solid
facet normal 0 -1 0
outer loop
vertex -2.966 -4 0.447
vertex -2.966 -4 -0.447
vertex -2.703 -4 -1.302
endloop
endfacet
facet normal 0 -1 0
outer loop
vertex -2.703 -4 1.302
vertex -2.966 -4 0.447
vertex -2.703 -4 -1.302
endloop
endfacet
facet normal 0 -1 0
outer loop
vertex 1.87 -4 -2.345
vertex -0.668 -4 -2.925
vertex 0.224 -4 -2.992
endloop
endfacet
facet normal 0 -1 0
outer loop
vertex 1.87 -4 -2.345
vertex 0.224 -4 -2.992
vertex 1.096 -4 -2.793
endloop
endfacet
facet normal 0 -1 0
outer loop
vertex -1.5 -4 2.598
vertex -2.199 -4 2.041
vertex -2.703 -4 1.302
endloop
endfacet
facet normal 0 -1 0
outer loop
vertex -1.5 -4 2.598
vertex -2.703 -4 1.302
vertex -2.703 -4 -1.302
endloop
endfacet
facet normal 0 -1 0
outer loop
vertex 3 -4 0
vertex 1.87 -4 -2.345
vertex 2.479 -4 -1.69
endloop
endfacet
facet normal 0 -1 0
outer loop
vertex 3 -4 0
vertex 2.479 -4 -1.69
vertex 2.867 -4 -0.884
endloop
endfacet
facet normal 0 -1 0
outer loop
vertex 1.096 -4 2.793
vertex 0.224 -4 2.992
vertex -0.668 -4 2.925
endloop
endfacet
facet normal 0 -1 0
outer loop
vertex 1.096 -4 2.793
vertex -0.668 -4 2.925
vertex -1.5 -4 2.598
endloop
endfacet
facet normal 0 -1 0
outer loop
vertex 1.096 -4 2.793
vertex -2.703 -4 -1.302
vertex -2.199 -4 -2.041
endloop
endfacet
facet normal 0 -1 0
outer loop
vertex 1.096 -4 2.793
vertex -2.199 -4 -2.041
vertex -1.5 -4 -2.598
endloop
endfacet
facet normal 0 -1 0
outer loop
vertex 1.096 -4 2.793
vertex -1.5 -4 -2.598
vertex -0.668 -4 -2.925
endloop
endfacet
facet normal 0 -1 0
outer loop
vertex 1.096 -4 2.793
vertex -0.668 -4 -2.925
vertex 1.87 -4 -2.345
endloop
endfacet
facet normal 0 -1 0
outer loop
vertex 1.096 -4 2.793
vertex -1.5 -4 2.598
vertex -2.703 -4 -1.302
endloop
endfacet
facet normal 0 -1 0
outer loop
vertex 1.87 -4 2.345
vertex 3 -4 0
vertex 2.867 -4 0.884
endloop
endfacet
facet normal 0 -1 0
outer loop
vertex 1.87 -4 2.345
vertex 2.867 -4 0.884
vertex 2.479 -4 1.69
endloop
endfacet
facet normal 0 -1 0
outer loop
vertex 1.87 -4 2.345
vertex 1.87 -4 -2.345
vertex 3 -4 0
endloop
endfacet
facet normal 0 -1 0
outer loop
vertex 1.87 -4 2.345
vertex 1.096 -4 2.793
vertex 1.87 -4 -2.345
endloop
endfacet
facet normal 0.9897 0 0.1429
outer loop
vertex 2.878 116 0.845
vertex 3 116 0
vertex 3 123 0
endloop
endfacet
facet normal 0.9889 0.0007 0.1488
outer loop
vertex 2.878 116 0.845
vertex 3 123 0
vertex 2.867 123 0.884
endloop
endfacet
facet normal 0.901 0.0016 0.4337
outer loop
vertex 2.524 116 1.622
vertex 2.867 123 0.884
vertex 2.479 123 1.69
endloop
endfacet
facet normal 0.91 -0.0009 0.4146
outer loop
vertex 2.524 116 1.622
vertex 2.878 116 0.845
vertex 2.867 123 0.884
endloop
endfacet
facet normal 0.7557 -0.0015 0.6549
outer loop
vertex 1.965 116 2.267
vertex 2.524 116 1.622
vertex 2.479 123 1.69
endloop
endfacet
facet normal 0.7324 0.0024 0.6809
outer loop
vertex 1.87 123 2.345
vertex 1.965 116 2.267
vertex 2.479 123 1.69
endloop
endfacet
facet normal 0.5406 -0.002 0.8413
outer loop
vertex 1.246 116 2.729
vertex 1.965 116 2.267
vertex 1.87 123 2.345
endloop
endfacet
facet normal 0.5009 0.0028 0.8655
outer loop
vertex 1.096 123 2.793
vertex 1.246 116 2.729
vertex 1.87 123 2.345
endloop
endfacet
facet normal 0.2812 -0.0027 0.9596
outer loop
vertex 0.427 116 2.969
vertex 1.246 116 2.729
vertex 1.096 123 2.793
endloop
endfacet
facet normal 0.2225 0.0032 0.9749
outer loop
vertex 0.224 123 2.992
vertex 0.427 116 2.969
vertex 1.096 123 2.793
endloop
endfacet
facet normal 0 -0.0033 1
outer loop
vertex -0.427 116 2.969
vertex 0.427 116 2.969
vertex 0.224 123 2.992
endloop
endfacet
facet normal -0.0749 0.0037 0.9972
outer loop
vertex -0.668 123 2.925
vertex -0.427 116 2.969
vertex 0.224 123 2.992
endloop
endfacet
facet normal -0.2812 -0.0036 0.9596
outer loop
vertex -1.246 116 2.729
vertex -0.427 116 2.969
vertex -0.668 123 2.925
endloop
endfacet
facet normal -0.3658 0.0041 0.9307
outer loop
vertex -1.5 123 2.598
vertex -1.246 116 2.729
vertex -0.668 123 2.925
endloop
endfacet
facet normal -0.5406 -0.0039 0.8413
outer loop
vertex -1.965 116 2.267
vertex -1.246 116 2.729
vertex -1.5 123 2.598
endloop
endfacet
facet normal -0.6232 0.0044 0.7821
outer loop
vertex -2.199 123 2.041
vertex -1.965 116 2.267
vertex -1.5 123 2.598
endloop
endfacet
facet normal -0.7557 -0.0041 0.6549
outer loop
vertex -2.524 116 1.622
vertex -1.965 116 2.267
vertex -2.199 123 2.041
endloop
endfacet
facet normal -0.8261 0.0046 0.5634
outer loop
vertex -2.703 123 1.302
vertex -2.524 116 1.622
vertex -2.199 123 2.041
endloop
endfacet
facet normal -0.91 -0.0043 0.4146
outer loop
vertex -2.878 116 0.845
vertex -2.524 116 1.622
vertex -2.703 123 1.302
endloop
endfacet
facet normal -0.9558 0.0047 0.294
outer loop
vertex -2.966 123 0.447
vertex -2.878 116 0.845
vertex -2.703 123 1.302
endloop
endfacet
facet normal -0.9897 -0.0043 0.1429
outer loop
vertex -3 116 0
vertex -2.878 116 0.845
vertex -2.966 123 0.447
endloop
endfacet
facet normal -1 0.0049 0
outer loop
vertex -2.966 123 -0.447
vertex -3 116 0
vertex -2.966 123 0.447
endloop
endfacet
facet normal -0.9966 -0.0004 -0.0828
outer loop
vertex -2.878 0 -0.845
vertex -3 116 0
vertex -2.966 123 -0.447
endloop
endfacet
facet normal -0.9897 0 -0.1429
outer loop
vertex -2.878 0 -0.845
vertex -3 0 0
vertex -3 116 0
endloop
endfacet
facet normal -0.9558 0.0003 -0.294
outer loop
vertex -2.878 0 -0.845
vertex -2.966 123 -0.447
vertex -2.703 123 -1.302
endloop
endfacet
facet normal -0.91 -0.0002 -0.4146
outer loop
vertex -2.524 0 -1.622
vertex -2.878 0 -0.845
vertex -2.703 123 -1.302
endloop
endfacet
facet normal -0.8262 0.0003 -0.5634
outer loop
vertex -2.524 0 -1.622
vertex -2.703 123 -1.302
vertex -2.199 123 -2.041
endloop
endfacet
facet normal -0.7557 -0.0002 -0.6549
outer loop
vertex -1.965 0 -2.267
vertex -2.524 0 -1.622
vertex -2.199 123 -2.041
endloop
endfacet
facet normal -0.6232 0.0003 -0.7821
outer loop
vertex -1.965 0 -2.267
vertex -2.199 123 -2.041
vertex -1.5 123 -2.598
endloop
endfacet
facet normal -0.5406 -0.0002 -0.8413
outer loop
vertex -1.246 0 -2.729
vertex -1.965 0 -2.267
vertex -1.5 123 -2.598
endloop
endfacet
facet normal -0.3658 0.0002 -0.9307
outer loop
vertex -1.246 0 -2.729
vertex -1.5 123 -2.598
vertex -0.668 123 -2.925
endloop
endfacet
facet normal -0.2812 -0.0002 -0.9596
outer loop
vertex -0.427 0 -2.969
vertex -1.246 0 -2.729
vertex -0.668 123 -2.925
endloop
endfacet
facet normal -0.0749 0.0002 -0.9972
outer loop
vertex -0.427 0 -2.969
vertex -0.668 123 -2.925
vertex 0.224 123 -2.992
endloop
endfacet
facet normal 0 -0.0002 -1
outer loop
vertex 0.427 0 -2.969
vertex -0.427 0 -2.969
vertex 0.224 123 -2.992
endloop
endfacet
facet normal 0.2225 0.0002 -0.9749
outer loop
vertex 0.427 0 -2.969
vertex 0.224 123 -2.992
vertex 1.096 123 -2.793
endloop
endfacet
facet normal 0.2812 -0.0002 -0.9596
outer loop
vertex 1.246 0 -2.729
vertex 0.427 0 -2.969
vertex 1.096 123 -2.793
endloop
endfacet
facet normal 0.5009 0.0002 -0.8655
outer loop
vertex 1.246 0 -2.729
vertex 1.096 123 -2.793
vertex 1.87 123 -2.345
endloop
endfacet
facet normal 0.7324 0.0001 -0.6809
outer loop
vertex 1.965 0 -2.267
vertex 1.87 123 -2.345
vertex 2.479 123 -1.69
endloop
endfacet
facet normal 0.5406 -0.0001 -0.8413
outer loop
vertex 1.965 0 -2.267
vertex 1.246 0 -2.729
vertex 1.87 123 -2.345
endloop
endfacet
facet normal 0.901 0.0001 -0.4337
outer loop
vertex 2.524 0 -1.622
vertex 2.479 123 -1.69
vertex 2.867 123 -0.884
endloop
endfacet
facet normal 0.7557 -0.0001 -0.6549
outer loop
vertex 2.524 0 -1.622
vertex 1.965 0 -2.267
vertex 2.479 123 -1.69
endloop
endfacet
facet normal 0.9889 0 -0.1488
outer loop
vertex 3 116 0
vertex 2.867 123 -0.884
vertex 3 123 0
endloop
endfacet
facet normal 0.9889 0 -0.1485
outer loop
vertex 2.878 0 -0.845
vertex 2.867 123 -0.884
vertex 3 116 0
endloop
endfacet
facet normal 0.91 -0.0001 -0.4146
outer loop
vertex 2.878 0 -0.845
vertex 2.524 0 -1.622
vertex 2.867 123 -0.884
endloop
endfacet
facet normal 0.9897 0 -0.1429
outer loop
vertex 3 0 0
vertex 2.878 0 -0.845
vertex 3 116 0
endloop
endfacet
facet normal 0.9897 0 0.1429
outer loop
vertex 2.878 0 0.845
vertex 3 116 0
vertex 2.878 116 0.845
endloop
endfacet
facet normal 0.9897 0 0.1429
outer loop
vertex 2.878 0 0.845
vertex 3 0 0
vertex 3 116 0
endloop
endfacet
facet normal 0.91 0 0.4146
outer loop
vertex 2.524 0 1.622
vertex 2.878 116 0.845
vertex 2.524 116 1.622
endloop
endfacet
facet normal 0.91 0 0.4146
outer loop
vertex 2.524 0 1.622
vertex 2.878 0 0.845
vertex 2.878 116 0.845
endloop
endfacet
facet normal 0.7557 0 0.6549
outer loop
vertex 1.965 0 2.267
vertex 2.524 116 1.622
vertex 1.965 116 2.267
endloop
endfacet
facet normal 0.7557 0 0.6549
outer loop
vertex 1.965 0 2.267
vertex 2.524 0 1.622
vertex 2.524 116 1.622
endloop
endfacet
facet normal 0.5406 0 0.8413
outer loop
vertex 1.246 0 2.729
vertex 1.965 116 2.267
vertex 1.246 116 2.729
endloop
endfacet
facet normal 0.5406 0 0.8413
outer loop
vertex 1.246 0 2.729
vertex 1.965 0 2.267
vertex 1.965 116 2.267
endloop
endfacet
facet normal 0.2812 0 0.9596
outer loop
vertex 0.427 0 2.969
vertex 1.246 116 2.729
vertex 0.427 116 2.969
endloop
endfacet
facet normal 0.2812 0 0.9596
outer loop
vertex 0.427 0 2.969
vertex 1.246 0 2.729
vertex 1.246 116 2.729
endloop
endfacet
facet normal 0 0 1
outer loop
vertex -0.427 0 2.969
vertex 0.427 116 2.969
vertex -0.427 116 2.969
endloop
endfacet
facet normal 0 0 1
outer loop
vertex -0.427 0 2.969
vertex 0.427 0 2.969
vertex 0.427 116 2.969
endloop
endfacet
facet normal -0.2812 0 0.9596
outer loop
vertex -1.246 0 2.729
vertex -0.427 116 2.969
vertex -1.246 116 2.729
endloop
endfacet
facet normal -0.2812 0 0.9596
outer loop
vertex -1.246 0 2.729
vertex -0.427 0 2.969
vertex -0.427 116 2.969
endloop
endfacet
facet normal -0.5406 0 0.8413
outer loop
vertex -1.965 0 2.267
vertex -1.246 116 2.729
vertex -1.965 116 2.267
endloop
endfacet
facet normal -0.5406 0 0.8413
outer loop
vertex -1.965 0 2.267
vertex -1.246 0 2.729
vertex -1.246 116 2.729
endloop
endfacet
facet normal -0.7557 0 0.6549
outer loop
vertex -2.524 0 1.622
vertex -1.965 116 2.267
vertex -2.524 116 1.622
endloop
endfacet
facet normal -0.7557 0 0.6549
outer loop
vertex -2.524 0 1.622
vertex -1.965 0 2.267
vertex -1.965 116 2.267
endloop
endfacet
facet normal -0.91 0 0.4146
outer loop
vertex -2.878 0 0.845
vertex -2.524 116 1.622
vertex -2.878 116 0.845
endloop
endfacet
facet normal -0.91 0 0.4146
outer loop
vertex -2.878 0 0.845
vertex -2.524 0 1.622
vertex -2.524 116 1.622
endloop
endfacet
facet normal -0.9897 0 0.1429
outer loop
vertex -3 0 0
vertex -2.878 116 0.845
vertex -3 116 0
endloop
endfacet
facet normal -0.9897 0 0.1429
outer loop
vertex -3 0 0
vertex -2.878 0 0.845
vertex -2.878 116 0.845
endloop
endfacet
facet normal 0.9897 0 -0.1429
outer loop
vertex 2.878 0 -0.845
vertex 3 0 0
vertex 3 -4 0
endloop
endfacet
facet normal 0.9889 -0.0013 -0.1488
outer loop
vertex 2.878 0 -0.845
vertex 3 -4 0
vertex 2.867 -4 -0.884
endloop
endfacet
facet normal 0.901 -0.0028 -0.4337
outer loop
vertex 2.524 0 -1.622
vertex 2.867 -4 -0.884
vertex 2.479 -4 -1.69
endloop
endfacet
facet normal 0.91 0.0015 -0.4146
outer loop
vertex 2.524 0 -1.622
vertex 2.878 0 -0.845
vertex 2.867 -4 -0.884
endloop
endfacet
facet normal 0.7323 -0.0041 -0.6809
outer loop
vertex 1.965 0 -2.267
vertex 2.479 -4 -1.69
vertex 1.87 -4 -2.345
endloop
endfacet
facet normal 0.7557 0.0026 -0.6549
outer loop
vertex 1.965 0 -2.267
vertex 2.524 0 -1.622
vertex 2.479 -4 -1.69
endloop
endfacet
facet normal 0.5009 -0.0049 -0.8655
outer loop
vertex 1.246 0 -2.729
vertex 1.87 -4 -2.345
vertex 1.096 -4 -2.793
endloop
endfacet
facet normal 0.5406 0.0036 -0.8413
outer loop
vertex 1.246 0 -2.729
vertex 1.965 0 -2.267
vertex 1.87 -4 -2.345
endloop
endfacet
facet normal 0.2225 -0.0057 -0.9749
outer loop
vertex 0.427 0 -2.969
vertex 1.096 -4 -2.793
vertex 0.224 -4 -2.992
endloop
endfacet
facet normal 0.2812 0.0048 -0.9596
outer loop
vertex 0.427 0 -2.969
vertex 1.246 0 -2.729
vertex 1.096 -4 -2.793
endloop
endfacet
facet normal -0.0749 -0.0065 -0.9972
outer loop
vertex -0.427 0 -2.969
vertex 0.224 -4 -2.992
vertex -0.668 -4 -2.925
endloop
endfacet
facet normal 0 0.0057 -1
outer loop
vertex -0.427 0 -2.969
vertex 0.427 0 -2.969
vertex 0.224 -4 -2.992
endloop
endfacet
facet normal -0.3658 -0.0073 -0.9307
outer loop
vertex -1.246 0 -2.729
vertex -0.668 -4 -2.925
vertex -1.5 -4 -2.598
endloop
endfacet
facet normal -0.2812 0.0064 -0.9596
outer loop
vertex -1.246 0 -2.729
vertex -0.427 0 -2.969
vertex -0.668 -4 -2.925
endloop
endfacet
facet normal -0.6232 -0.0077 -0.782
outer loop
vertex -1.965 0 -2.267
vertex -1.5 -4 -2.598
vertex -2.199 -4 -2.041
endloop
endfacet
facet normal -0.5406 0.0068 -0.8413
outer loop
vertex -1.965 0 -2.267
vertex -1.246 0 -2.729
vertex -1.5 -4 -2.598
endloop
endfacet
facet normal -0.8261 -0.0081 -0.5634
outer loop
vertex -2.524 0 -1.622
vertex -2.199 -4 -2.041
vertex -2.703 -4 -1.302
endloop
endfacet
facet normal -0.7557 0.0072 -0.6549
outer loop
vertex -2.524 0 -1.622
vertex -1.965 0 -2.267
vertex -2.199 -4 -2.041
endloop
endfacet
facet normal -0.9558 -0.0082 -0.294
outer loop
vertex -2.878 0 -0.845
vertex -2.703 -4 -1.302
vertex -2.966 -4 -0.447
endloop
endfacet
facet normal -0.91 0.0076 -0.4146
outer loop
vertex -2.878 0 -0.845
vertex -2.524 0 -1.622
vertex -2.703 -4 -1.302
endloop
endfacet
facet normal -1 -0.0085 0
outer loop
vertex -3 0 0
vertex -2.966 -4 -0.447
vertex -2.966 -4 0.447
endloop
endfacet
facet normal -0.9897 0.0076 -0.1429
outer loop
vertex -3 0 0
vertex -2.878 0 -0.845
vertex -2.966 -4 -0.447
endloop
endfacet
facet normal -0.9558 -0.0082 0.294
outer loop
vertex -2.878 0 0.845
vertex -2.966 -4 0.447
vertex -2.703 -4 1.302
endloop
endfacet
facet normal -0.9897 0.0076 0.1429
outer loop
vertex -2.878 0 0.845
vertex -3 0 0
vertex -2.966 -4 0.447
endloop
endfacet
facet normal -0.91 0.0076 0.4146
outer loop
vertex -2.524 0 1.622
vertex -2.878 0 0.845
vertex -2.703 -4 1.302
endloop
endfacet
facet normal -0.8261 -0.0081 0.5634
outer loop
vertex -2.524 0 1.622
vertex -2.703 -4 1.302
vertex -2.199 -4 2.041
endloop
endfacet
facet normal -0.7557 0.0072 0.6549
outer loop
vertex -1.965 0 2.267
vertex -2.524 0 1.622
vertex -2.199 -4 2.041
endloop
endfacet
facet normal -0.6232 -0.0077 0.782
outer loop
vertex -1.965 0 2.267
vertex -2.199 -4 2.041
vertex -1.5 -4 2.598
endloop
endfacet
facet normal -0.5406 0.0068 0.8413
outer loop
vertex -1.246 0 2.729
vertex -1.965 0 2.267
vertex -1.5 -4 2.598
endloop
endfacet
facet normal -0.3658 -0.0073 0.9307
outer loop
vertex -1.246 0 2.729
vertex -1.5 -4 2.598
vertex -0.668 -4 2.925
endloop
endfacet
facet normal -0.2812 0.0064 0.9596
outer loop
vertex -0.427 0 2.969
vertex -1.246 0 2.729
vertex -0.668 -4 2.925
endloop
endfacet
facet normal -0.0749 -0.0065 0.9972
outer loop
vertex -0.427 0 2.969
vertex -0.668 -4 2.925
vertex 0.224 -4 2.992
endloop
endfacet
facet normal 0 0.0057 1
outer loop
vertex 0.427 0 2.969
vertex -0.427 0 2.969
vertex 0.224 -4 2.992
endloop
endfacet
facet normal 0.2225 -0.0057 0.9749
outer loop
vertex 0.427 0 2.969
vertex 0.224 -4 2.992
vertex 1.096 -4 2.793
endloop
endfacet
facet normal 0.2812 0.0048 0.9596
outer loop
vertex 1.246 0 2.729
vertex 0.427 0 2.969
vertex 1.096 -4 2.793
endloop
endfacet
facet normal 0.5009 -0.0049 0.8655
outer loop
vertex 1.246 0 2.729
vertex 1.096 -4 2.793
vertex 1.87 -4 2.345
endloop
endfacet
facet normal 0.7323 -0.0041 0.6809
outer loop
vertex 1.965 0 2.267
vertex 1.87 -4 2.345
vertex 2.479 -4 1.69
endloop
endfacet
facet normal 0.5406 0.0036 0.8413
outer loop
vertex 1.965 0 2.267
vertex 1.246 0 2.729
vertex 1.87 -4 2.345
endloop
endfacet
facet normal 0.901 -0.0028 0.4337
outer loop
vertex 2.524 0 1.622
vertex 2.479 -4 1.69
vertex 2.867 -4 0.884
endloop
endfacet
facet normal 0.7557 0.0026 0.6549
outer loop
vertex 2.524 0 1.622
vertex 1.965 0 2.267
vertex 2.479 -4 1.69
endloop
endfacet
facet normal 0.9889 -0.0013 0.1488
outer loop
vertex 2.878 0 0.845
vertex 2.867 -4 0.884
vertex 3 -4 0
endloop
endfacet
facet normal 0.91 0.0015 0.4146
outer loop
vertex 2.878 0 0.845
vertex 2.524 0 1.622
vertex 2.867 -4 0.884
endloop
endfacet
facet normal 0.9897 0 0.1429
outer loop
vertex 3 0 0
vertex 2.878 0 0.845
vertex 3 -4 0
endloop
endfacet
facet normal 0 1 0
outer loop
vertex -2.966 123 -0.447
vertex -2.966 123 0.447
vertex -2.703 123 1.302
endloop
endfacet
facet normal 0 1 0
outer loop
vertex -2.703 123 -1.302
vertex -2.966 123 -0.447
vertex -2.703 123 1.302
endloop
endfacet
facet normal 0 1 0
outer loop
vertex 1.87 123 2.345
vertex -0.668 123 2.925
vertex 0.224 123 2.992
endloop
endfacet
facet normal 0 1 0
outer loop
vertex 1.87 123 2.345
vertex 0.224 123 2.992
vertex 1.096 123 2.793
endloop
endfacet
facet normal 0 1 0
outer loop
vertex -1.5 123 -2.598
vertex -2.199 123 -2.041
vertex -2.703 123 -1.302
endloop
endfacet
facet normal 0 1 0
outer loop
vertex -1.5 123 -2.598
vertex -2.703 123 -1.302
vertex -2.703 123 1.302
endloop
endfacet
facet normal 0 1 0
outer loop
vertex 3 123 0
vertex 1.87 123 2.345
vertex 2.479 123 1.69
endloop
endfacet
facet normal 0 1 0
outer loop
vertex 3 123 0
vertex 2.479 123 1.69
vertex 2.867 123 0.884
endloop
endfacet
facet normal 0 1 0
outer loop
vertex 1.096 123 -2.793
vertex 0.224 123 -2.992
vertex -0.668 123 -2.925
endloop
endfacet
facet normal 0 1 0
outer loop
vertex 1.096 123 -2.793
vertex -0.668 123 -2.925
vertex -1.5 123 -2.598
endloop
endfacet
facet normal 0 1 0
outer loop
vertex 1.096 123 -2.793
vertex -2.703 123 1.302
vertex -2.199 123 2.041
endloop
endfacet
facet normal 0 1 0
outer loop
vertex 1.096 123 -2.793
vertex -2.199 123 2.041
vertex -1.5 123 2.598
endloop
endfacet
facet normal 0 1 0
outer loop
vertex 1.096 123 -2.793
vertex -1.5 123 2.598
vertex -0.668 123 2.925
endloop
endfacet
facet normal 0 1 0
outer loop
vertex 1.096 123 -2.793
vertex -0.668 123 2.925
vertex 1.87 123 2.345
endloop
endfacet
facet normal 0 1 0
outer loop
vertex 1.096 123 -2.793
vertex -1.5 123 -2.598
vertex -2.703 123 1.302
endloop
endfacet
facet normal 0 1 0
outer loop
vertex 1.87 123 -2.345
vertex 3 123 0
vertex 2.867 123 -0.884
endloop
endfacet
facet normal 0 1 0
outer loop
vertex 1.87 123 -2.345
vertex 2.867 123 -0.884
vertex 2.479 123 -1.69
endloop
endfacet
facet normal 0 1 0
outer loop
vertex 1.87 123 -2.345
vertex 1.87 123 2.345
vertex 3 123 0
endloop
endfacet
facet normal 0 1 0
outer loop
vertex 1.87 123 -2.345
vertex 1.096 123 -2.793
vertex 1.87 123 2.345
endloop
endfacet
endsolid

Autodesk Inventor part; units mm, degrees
ref_plane "YZ Plane" through (0, 0, 0) normal (1, 0, 0) x (0, 1, 0)
ref_plane "XZ Plane" through (0, 0, 0) normal (0, 1, 0) x (-1, 0, 0)
ref_plane "XY Plane" through (0, 0, 0) normal (0, 0, 1) x (1, 0, 0)
sketch "Sketch1" plane through (0, 0, 0) normal (0, 1, 0) x (-1, 0, 0)
  point P0 (0, 0)
sketch "Sketch2" plane through (0, 0, 0) normal (0, 1, 0) x (-1, 0, 0)
  circle A0 centre (0, 0) radius 3
  dimension "d0" = 6
extrude "Extrusion1" add sketch "Sketch2" along normal blind 116
sketch "Sketch3" plane through (0, 116, 0) normal (0, 1, 0) x (1, 0, 0)
  circle A0 centre (0, 0) radius 3
extrude "Extrusion2" add sketch "Sketch3" along normal blind 10
sketch "Sketch4" plane through (0, 0, 0) normal (0, -1, 0) x (1, 0, 0)
  circle A0 centre (0, 0) radius 3 projected
  circle A1 centre (0, 0) radius 3
  dimension "d5" = 6
extrude "Extrusion3" add sketch "Sketch4" along normal blind 10
fillet "Fillet1" radius 2 1 edges at (-3, -10, 0)
fillet "Face Fillet1" radius 2 1 edges at (-3, 126, 0)
sketch "Sketch5" plane through (0, 126, 0) normal (0, 1, 0) x (1, 0, 0)
  circle A0 centre (0, 0) radius 3
extrude "Extrusion4" cut sketch "Sketch5" against normal blind 2
sketch "Sketch6" plane through (0, 124, 0) normal (0, 1, 0) x (1, 0, 0)
  circle A0 centre (0, 0) radius 3
extrude "Extrusion5" cut sketch "Sketch6" against normal blind 1
sketch "Sketch7" plane through (0, -10, 0) normal (0, -1, 0) x (1, 0, 0)
  circle A0 centre (0, 0) radius 3
  dimension "d14" = 6
extrude "Extrusion6" cut sketch "Sketch7" against normal blind 3
sketch "Sketch8" plane through (0, -7, 0) normal (0, -1, 0) x (1, 0, 0)
  circle A0 centre (0, 0) radius 3
  dimension "d17" = 6
extrude "Extrusion7" cut sketch "Sketch8" against normal blind 2
sketch "Sketch9" plane through (0, -5, 0) normal (0, -1, 0) x (1, 0, 0)
  circle A0 centre (0, 0) radius 3
  dimension "d20" = 6
extrude "Extrusion8" cut sketch "Sketch9" against normal blind 1
properties material "Gold"
